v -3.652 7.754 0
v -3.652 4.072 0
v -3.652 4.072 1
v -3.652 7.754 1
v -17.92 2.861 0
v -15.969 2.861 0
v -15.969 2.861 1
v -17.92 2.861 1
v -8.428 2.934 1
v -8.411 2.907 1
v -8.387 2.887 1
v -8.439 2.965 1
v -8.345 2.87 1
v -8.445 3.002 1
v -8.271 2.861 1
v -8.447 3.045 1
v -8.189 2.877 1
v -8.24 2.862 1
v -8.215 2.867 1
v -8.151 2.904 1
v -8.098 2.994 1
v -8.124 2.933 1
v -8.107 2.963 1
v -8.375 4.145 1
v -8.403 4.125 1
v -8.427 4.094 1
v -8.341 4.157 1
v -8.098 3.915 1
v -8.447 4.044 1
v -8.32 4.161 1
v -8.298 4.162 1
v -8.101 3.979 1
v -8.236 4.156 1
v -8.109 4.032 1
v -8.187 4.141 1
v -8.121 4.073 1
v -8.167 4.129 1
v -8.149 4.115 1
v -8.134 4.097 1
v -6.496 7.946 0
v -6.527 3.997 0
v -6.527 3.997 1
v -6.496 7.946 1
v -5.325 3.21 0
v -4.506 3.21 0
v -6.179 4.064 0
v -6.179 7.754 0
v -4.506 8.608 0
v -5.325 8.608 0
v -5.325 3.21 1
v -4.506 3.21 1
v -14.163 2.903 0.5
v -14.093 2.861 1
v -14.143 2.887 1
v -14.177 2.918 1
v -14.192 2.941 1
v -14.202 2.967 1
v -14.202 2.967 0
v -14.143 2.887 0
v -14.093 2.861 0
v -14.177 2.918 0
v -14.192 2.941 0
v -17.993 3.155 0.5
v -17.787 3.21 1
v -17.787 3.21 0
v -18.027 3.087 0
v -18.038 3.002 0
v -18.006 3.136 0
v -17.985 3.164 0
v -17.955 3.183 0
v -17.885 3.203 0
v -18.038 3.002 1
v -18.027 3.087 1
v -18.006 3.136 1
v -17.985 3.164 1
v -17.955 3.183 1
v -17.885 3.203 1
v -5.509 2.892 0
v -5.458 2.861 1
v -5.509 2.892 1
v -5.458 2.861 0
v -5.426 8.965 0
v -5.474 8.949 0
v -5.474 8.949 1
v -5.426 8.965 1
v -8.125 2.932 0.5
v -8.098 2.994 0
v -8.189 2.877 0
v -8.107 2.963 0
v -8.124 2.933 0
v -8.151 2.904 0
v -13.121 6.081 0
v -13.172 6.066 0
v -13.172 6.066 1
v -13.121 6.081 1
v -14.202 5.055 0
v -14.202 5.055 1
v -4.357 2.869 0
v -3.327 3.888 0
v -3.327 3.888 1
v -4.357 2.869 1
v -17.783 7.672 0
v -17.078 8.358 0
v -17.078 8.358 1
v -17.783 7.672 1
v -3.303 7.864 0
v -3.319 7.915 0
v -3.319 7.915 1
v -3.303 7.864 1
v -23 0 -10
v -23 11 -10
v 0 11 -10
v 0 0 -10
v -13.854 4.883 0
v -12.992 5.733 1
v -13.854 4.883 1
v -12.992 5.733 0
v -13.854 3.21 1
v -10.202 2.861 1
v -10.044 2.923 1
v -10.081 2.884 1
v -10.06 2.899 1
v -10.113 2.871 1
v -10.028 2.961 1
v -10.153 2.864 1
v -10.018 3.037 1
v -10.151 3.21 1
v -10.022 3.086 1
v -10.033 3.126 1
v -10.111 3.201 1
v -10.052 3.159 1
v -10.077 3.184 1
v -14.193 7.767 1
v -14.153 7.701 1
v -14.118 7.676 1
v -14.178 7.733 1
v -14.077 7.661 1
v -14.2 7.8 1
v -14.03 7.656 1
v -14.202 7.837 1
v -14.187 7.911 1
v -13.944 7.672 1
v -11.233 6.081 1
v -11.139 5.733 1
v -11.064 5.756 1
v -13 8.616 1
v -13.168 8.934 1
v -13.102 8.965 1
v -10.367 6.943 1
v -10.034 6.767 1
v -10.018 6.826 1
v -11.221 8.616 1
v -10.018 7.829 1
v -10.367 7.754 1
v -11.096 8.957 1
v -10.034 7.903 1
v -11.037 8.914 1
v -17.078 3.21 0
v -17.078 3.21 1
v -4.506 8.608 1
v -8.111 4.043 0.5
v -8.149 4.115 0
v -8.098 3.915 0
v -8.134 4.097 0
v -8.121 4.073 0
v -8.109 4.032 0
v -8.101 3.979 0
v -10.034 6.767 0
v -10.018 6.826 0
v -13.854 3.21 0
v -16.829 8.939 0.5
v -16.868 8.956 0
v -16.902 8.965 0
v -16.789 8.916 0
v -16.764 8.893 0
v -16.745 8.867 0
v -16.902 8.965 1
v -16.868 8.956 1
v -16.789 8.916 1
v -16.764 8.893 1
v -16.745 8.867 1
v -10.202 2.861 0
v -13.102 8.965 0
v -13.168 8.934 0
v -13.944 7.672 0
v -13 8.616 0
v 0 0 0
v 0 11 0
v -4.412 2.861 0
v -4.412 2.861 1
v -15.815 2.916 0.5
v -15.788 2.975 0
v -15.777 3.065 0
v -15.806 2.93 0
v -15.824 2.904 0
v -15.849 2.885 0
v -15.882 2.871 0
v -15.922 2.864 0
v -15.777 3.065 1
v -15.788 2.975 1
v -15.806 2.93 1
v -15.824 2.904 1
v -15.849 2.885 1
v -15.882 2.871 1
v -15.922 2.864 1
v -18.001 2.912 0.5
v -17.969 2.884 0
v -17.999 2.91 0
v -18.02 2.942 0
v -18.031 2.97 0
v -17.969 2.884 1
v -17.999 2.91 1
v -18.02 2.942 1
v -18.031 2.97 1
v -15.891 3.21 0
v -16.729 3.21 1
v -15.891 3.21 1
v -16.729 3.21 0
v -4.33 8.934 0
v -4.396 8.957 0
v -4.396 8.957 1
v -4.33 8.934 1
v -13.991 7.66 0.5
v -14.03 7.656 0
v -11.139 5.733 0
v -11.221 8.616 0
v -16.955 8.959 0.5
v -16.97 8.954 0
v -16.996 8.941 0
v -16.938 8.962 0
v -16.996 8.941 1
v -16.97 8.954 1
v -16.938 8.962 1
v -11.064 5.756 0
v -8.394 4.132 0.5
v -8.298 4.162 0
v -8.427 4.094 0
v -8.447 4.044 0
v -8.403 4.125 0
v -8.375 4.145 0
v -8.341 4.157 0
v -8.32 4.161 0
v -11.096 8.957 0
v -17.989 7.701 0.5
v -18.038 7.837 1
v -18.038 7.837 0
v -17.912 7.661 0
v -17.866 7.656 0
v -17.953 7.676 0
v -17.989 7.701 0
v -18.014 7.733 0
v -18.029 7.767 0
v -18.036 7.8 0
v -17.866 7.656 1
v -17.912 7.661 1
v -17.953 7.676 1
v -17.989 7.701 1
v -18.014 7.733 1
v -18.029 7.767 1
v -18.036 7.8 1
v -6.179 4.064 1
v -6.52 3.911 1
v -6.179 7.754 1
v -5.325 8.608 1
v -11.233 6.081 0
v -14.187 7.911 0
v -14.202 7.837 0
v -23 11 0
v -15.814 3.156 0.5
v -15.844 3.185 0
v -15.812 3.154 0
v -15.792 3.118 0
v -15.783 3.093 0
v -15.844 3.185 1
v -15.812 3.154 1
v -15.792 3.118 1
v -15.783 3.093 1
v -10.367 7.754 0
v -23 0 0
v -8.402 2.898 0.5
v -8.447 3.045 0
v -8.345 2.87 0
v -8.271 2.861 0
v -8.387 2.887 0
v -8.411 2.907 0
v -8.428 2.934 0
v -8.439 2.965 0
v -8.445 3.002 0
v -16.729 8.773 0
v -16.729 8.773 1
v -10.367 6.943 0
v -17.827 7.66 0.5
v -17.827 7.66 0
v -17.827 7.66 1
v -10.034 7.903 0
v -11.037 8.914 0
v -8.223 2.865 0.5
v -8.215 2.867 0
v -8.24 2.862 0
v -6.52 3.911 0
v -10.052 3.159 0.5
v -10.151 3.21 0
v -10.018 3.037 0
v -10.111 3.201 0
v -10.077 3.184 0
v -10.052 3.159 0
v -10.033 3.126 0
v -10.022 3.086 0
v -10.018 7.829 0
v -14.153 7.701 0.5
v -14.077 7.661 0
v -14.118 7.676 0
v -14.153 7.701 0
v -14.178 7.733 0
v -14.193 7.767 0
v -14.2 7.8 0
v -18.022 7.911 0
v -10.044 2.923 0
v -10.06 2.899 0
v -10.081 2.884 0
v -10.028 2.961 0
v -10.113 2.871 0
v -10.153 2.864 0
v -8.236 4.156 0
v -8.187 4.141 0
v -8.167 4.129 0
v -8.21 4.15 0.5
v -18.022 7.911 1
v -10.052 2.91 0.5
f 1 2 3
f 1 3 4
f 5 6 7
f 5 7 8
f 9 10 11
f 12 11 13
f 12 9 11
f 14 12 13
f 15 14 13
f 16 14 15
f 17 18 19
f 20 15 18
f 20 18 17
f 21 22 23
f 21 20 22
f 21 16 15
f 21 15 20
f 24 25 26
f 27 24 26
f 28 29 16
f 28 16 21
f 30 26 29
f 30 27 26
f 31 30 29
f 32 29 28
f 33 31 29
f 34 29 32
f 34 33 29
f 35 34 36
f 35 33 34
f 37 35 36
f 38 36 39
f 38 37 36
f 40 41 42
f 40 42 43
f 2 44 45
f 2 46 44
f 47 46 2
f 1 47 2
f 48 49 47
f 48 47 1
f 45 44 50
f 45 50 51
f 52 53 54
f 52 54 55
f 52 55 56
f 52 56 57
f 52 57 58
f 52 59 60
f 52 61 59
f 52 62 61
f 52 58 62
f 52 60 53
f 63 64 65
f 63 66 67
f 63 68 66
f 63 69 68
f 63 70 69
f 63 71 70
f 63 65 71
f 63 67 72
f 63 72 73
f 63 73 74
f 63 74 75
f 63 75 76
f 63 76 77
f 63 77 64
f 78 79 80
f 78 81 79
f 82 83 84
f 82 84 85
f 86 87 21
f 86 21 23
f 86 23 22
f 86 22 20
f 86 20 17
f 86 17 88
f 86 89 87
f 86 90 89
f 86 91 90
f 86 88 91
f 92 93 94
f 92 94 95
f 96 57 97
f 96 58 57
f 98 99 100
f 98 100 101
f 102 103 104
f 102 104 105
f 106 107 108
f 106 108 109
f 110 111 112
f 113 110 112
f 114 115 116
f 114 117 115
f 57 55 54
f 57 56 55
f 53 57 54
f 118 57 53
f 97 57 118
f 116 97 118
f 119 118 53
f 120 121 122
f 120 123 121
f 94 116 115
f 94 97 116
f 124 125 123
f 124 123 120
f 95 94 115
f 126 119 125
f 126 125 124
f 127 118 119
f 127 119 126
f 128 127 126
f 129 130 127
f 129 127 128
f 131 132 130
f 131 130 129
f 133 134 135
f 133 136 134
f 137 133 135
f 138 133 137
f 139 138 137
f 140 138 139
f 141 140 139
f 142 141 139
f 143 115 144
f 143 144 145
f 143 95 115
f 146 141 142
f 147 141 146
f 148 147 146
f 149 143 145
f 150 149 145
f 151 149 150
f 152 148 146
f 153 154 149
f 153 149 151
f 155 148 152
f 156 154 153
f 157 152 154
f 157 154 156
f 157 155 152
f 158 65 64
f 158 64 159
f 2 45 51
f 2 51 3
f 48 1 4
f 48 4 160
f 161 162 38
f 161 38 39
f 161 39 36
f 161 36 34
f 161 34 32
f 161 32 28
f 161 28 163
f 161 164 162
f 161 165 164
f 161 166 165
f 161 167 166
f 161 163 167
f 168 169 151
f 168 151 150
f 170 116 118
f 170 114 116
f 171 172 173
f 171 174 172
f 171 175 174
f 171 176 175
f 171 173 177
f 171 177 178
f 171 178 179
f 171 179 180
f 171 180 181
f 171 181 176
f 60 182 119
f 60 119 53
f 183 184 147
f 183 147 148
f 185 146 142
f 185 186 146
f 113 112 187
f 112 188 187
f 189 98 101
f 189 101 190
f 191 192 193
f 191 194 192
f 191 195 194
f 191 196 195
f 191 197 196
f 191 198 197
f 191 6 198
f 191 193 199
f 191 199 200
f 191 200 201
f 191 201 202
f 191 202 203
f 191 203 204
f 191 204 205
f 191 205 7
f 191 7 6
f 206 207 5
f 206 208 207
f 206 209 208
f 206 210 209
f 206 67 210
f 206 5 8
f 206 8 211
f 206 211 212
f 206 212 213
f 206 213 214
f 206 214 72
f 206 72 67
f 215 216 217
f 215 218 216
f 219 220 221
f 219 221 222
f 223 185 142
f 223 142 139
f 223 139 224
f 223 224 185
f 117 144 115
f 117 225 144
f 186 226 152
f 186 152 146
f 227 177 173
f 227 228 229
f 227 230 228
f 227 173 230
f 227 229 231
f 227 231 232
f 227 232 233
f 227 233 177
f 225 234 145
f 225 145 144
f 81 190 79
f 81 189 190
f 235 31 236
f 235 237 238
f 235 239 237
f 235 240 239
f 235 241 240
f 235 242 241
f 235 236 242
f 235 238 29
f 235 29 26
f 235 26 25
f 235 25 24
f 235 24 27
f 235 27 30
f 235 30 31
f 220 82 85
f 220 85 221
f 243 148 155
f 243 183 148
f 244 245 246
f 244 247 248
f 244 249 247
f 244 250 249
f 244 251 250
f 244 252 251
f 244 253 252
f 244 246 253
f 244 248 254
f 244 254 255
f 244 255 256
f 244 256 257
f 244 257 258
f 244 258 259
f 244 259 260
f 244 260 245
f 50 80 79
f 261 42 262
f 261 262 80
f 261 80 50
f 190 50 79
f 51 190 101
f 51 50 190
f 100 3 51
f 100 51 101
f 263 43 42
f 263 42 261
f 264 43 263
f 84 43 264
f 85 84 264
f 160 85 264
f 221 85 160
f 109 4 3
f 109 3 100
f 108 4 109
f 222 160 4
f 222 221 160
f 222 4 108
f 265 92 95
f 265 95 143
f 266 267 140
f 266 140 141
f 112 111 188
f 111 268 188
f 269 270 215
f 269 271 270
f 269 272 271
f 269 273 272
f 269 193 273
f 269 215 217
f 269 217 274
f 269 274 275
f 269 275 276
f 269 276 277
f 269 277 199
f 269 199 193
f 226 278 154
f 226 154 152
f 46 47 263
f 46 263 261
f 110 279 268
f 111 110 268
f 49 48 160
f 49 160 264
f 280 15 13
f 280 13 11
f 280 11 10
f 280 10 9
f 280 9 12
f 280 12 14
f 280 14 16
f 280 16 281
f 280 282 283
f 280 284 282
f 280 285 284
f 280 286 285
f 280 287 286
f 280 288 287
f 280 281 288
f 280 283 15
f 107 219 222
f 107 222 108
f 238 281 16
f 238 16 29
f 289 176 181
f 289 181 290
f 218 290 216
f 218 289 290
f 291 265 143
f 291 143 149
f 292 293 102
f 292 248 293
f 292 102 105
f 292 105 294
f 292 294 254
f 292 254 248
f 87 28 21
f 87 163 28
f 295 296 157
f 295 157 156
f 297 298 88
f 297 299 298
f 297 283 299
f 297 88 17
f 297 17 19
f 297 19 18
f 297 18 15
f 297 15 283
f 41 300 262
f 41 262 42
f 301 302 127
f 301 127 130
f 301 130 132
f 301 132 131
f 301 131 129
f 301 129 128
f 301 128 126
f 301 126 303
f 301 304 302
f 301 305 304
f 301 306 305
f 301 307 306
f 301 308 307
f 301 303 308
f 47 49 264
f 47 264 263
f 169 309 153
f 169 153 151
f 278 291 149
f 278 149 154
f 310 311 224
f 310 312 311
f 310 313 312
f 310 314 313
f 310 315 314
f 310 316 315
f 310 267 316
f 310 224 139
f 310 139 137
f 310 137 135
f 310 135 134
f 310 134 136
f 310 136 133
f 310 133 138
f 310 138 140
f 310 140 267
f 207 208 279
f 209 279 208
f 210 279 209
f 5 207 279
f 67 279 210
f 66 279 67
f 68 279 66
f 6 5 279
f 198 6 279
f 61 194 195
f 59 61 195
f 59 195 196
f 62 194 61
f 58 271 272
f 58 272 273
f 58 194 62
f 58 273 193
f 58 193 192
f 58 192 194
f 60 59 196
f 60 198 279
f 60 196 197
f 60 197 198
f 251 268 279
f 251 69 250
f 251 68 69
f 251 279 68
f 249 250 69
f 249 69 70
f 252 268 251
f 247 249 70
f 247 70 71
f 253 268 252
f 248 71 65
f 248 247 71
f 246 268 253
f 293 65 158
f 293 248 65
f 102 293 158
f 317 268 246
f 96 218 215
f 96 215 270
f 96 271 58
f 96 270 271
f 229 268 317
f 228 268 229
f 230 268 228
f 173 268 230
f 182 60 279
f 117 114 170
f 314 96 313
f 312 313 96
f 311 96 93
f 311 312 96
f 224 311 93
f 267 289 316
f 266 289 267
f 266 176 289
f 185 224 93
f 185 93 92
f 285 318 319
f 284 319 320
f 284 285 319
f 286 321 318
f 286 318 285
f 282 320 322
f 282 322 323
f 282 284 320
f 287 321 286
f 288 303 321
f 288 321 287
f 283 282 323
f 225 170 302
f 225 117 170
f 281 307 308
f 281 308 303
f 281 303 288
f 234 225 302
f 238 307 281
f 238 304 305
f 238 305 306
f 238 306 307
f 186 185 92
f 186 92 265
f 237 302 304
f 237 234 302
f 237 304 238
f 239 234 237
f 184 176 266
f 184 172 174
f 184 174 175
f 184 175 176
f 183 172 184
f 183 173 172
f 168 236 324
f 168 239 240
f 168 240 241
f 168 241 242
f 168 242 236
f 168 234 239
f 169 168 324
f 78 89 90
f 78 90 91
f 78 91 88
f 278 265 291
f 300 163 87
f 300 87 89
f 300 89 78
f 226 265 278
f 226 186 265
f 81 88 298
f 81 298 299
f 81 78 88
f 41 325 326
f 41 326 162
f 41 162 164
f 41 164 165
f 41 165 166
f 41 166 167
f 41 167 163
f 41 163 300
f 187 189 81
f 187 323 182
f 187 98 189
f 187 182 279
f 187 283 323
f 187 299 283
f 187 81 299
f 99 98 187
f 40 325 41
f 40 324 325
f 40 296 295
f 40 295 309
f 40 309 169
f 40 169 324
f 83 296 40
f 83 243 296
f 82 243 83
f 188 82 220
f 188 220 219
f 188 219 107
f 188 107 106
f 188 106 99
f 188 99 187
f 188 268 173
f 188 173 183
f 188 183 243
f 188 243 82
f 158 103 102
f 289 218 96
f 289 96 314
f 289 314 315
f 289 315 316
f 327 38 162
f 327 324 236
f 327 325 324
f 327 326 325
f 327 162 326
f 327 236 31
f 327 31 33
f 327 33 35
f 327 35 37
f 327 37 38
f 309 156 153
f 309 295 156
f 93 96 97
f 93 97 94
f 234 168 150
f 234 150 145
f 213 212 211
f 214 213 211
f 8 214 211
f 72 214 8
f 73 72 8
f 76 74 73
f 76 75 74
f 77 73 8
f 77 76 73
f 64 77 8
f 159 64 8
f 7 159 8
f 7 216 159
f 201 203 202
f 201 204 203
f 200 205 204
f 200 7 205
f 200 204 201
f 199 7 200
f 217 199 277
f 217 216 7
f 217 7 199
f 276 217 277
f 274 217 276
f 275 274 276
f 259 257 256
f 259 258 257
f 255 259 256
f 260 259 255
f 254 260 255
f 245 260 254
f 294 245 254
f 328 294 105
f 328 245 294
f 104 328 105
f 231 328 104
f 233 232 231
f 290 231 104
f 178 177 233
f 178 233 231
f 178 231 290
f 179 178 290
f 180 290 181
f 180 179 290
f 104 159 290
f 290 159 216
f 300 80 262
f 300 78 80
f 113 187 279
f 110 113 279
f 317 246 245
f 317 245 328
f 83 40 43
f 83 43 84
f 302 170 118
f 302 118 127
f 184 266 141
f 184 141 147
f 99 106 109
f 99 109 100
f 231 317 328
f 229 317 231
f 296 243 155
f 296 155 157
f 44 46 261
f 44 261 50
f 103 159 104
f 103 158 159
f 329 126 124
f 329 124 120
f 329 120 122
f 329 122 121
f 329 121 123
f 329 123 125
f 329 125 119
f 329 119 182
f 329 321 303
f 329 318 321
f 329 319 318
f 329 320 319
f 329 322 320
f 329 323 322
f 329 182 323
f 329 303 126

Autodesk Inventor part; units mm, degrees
ref_plane "YZ Plane" through (0, 0, 0) normal (1, 0, 0) x (0, 1, 0)
ref_plane "XZ Plane" through (0, 0, 0) normal (0, 1, 0) x (-1, 0, 0)
ref_plane "XY Plane" through (0, 0, 0) normal (0, 0, 1) x (1, 0, 0)
sketch "Sketch1" plane through (0, 0, 0) normal (0, 0, 1) x (1, 0, 0)
  line L0 (0, 0) -> (-23, 0)
  line L1 (-23, 0) -> (-23, 11)
  line L2 (-23, 11) -> (0, 11)
  line L3 (0, 11) -> (0, 0)
  line L4 (-17.8694, 8.961) -> (2.181, 8.961) construction
  line L5 (2.181, 8.961) -> (2.181, 1.8992) construction
  line L6 (2.181, 1.8992) -> (-17.8694, 1.8992) construction
  line L7 (-17.8694, 1.8992) -> (-17.8694, 8.961) construction
  line L8 (-16.745, 8.867) -> (-16.7294, 8.7729)
  line L9 (-16.7294, 8.7729) -> (-16.7294, 3.2097)
  line L10 (-16.7294, 3.2097) -> (-15.891, 3.2097)
  spline S0 degree 2 poles (-15.891, 3.2097) (-15.793, 3.1744) (-15.7773, 3.0647) knots 0 0 0 1 1 1
  spline S1 degree 2 poles (-15.7773, 3.0647) (-15.7773, 2.9707) (-15.8518, 2.861) (-15.9693, 2.861) knots 0 0 0 1 2 2 2
  line L11 (-15.9693, 2.861) -> (-17.9204, 2.861)
  spline S2 degree 2 poles (-17.9204, 2.861) (-18.0222, 2.8923) (-18.0379, 3.002) knots 0 0 0 1 1 1
  spline S3 degree 2 poles (-18.0379, 3.002) (-18.0379, 3.1) (-17.9478, 3.2097) (-17.7872, 3.2097) knots 0 0 0 1 2 2 2
  line L12 (-17.7872, 3.2097) -> (-17.078, 3.2097)
  line L13 (-17.078, 3.2097) -> (-17.078, 8.3577)
  line L14 (-17.078, 8.3577) -> (-17.7832, 7.672)
  spline S4 degree 2 poles (-17.7832, 7.672) (-17.8303, 7.6564) (-17.8655, 7.6564) knots 0 0 0 1 1 1
  spline S5 degree 2 poles (-17.8655, 7.6564) (-17.94, 7.6564) (-18.0379, 7.7465) (-18.0379, 7.8366) knots 0 0 0 1 2 2 2
  line L15 (-18.0379, 7.8366) -> (-18.0222, 7.911)
  line L16 (-18.0222, 7.911) -> (-16.9958, 8.9414)
  spline S6 degree 2 poles (-16.9958, 8.9414) (-16.9605, 8.9649) (-16.9017, 8.9649) knots 0 0 0 1 1 1
  spline S7 degree 2 poles (-16.9017, 8.9649) (-16.8861, 8.9649) (-16.7725, 8.914) (-16.745, 8.867) knots 0 0 0 1 2 2 2
  line L17 (-11.0368, 8.914) -> (-10.0339, 7.9032)
  line L18 (-10.0339, 7.9032) -> (-10.0182, 7.8288)
  line L19 (-10.0182, 7.8288) -> (-10.0182, 6.8258)
  line L20 (-10.0182, 6.8258) -> (-10.0339, 6.767)
  line L21 (-10.0339, 6.767) -> (-11.0642, 5.7562)
  line L22 (-11.0642, 5.7562) -> (-11.1387, 5.7327)
  line L23 (-11.1387, 5.7327) -> (-12.9918, 5.7327)
  line L24 (-12.9918, 5.7327) -> (-13.8537, 4.8826)
  line L25 (-13.8537, 4.8826) -> (-13.8537, 3.2097)
  line L26 (-13.8537, 3.2097) -> (-10.1514, 3.2097)
  spline S8 degree 2 poles (-10.1514, 3.2097) (-10.0182, 3.194) (-10.0182, 3.0373) knots 0 0 0 1 1 1
  spline S9 degree 2 poles (-10.0182, 3.0373) (-10.0182, 2.9589) (-10.0848, 2.861) (-10.2023, 2.861) knots 0 0 0 1 2 2 2
  line L27 (-10.2023, 2.861) -> (-14.0927, 2.861)
  spline S10 degree 2 poles (-14.0927, 2.861) (-14.1789, 2.8923) (-14.2024, 2.9668) knots 0 0 0 1 1 1
  line L28 (-14.2024, 2.9668) -> (-14.2024, 3.1352)
  line L29 (-14.2024, 3.1352) -> (-14.2024, 5.055)
  line L30 (-14.2024, 5.055) -> (-13.172, 6.0658)
  line L31 (-13.172, 6.0658) -> (-13.1211, 6.0814)
  line L32 (-13.1211, 6.0814) -> (-11.2327, 6.0814)
  line L33 (-11.2327, 6.0814) -> (-10.3669, 6.9433)
  line L34 (-10.3669, 6.9433) -> (-10.3669, 7.7543)
  line L35 (-10.3669, 7.7543) -> (-11.2209, 8.6162)
  line L36 (-11.2209, 8.6162) -> (-12.9996, 8.6162)
  line L37 (-12.9996, 8.6162) -> (-13.9438, 7.672)
  spline S11 degree 2 poles (-13.9438, 7.672) (-13.9947, 7.6564) (-14.03, 7.6564) knots 0 0 0 1 1 1
  spline S12 degree 2 poles (-14.03, 7.6564) (-14.1044, 7.6564) (-14.2024, 7.7465) (-14.2024, 7.8366) knots 0 0 0 1 2 2 2
  line L38 (-14.2024, 7.8366) -> (-14.1867, 7.911)
  line L39 (-14.1867, 7.911) -> (-13.1681, 8.9336)
  line L40 (-13.1681, 8.9336) -> (-13.1015, 8.9649)
  line L41 (-13.1015, 8.9649) -> (-11.0956, 8.9571)
  line L42 (-11.0956, 8.9571) -> (-11.0368, 8.914)
  spline S13 degree 2 poles (-8.1494, 4.1147) (-8.0985, 4.0716) (-8.0985, 3.9149) knots 0 0 0 1 1 1
  line L43 (-8.0985, 3.9149) -> (-8.0985, 2.9942)
  spline S14 degree 2 poles (-8.0985, 2.9942) (-8.1063, 2.9276) (-8.1886, 2.8767) knots 0 0 0 1 1 1
  spline S15 degree 2 poles (-8.1886, 2.8767) (-8.216, 2.861) (-8.2708, 2.861) knots 0 0 0 1 1 1
  spline S16 degree 2 poles (-8.2708, 2.861) (-8.357, 2.861) (-8.4471, 2.9354) (-8.4471, 3.0451) knots 0 0 0 1 2 2 2
  line L44 (-8.4471, 3.0451) -> (-8.4471, 4.0442)
  spline S17 degree 2 poles (-8.4471, 4.0442) (-8.4158, 4.1617) (-8.2983, 4.1617) knots 0 0 0 1 1 1
  spline S18 degree 2 poles (-8.2983, 4.1617) (-8.1964, 4.1617) (-8.1494, 4.1147) knots 0 0 0 1 1 1
  line L45 (-4.3296, 8.9336) -> (-3.3188, 7.9149)
  line L46 (-3.3188, 7.9149) -> (-3.3031, 7.864)
  line L47 (-3.3031, 7.864) -> (-3.3266, 3.8875)
  line L48 (-3.3266, 3.8875) -> (-4.357, 2.8688)
  line L49 (-4.357, 2.8688) -> (-4.4118, 2.861)
  line L50 (-4.4118, 2.861) -> (-5.4579, 2.861)
  line L51 (-5.4579, 2.861) -> (-5.5088, 2.8923)
  line L52 (-5.5088, 2.8923) -> (-6.5196, 3.911)
  line L53 (-6.5196, 3.911) -> (-6.5274, 3.9972)
  line L54 (-6.5274, 3.9972) -> (-6.4961, 7.9463)
  line L55 (-6.4961, 7.9463) -> (-5.4735, 8.9492)
  line L56 (-5.4735, 8.9492) -> (-5.4265, 8.9649)
  line L57 (-5.4265, 8.9649) -> (-4.3962, 8.9571)
  line L58 (-4.3962, 8.9571) -> (-4.3296, 8.9336)
  line L59 (-3.6518, 7.7543) -> (-4.5059, 8.6084)
  line L60 (-4.5059, 8.6084) -> (-5.3247, 8.6084)
  line L61 (-5.3247, 8.6084) -> (-6.1787, 7.7543)
  line L62 (-6.1787, 7.7543) -> (-6.1787, 4.0638)
  line L63 (-6.1787, 4.0638) -> (-5.3247, 3.2097)
  line L64 (-5.3247, 3.2097) -> (-4.5059, 3.2097)
  line L65 (-4.5059, 3.2097) -> (-3.6518, 4.0716)
  line L66 (-3.6518, 4.0716) -> (-3.6518, 7.7543)
  dimension "d0" = 23
  dimension "d1" = 11
extrude "Extrusion1" add sketch "Sketch1" against normal blind 10 contours L0 L1 L2 L3 | L8 L9 L10 S0 S1 L11 S2 S3 L12 L13 L14 S4 S5 L15 L16 S6 S7 | L17 L18 L19 L20 L21 L22 L23 L24 L25 L26 S8 S9 L27 S10 L28 L29 L30 L31 L32 L33 L34 L35 L36 L37 S11 S12 L38 L39 L40 L41 L42 | S13 L43 S14 S15 S16 L44 S17 S18 | L45 L46 L47 L48 L49 L50 L51 L52 L53 L54 L55 L56 L57 L58 | L66 L65 L64 L63 L62 L61 L60 L59
extrude "Extrusion2" add sketch "Sketch1" along normal blind 1 contours L8 L9 L10 S0 S1 L11 S2 S3 L12 L13 L14 S4 S5 L15 L16 S6 S7 | L17 L18 L19 L20 L21 L22 L23 L24 L25 L26 S8 S9 L27 S10 L28 L29 L30 L31 L32 L33 L34 L35 L36 L37 S11 S12 L38 L39 L40 L41 L42 | S13 L43 S14 S15 S16 L44 S17 S18 | L45 L46 L47 L48 L49 L50 L51 L52 L53 L54 L55 L56 L57 L58
properties part number "VolteMeter"
